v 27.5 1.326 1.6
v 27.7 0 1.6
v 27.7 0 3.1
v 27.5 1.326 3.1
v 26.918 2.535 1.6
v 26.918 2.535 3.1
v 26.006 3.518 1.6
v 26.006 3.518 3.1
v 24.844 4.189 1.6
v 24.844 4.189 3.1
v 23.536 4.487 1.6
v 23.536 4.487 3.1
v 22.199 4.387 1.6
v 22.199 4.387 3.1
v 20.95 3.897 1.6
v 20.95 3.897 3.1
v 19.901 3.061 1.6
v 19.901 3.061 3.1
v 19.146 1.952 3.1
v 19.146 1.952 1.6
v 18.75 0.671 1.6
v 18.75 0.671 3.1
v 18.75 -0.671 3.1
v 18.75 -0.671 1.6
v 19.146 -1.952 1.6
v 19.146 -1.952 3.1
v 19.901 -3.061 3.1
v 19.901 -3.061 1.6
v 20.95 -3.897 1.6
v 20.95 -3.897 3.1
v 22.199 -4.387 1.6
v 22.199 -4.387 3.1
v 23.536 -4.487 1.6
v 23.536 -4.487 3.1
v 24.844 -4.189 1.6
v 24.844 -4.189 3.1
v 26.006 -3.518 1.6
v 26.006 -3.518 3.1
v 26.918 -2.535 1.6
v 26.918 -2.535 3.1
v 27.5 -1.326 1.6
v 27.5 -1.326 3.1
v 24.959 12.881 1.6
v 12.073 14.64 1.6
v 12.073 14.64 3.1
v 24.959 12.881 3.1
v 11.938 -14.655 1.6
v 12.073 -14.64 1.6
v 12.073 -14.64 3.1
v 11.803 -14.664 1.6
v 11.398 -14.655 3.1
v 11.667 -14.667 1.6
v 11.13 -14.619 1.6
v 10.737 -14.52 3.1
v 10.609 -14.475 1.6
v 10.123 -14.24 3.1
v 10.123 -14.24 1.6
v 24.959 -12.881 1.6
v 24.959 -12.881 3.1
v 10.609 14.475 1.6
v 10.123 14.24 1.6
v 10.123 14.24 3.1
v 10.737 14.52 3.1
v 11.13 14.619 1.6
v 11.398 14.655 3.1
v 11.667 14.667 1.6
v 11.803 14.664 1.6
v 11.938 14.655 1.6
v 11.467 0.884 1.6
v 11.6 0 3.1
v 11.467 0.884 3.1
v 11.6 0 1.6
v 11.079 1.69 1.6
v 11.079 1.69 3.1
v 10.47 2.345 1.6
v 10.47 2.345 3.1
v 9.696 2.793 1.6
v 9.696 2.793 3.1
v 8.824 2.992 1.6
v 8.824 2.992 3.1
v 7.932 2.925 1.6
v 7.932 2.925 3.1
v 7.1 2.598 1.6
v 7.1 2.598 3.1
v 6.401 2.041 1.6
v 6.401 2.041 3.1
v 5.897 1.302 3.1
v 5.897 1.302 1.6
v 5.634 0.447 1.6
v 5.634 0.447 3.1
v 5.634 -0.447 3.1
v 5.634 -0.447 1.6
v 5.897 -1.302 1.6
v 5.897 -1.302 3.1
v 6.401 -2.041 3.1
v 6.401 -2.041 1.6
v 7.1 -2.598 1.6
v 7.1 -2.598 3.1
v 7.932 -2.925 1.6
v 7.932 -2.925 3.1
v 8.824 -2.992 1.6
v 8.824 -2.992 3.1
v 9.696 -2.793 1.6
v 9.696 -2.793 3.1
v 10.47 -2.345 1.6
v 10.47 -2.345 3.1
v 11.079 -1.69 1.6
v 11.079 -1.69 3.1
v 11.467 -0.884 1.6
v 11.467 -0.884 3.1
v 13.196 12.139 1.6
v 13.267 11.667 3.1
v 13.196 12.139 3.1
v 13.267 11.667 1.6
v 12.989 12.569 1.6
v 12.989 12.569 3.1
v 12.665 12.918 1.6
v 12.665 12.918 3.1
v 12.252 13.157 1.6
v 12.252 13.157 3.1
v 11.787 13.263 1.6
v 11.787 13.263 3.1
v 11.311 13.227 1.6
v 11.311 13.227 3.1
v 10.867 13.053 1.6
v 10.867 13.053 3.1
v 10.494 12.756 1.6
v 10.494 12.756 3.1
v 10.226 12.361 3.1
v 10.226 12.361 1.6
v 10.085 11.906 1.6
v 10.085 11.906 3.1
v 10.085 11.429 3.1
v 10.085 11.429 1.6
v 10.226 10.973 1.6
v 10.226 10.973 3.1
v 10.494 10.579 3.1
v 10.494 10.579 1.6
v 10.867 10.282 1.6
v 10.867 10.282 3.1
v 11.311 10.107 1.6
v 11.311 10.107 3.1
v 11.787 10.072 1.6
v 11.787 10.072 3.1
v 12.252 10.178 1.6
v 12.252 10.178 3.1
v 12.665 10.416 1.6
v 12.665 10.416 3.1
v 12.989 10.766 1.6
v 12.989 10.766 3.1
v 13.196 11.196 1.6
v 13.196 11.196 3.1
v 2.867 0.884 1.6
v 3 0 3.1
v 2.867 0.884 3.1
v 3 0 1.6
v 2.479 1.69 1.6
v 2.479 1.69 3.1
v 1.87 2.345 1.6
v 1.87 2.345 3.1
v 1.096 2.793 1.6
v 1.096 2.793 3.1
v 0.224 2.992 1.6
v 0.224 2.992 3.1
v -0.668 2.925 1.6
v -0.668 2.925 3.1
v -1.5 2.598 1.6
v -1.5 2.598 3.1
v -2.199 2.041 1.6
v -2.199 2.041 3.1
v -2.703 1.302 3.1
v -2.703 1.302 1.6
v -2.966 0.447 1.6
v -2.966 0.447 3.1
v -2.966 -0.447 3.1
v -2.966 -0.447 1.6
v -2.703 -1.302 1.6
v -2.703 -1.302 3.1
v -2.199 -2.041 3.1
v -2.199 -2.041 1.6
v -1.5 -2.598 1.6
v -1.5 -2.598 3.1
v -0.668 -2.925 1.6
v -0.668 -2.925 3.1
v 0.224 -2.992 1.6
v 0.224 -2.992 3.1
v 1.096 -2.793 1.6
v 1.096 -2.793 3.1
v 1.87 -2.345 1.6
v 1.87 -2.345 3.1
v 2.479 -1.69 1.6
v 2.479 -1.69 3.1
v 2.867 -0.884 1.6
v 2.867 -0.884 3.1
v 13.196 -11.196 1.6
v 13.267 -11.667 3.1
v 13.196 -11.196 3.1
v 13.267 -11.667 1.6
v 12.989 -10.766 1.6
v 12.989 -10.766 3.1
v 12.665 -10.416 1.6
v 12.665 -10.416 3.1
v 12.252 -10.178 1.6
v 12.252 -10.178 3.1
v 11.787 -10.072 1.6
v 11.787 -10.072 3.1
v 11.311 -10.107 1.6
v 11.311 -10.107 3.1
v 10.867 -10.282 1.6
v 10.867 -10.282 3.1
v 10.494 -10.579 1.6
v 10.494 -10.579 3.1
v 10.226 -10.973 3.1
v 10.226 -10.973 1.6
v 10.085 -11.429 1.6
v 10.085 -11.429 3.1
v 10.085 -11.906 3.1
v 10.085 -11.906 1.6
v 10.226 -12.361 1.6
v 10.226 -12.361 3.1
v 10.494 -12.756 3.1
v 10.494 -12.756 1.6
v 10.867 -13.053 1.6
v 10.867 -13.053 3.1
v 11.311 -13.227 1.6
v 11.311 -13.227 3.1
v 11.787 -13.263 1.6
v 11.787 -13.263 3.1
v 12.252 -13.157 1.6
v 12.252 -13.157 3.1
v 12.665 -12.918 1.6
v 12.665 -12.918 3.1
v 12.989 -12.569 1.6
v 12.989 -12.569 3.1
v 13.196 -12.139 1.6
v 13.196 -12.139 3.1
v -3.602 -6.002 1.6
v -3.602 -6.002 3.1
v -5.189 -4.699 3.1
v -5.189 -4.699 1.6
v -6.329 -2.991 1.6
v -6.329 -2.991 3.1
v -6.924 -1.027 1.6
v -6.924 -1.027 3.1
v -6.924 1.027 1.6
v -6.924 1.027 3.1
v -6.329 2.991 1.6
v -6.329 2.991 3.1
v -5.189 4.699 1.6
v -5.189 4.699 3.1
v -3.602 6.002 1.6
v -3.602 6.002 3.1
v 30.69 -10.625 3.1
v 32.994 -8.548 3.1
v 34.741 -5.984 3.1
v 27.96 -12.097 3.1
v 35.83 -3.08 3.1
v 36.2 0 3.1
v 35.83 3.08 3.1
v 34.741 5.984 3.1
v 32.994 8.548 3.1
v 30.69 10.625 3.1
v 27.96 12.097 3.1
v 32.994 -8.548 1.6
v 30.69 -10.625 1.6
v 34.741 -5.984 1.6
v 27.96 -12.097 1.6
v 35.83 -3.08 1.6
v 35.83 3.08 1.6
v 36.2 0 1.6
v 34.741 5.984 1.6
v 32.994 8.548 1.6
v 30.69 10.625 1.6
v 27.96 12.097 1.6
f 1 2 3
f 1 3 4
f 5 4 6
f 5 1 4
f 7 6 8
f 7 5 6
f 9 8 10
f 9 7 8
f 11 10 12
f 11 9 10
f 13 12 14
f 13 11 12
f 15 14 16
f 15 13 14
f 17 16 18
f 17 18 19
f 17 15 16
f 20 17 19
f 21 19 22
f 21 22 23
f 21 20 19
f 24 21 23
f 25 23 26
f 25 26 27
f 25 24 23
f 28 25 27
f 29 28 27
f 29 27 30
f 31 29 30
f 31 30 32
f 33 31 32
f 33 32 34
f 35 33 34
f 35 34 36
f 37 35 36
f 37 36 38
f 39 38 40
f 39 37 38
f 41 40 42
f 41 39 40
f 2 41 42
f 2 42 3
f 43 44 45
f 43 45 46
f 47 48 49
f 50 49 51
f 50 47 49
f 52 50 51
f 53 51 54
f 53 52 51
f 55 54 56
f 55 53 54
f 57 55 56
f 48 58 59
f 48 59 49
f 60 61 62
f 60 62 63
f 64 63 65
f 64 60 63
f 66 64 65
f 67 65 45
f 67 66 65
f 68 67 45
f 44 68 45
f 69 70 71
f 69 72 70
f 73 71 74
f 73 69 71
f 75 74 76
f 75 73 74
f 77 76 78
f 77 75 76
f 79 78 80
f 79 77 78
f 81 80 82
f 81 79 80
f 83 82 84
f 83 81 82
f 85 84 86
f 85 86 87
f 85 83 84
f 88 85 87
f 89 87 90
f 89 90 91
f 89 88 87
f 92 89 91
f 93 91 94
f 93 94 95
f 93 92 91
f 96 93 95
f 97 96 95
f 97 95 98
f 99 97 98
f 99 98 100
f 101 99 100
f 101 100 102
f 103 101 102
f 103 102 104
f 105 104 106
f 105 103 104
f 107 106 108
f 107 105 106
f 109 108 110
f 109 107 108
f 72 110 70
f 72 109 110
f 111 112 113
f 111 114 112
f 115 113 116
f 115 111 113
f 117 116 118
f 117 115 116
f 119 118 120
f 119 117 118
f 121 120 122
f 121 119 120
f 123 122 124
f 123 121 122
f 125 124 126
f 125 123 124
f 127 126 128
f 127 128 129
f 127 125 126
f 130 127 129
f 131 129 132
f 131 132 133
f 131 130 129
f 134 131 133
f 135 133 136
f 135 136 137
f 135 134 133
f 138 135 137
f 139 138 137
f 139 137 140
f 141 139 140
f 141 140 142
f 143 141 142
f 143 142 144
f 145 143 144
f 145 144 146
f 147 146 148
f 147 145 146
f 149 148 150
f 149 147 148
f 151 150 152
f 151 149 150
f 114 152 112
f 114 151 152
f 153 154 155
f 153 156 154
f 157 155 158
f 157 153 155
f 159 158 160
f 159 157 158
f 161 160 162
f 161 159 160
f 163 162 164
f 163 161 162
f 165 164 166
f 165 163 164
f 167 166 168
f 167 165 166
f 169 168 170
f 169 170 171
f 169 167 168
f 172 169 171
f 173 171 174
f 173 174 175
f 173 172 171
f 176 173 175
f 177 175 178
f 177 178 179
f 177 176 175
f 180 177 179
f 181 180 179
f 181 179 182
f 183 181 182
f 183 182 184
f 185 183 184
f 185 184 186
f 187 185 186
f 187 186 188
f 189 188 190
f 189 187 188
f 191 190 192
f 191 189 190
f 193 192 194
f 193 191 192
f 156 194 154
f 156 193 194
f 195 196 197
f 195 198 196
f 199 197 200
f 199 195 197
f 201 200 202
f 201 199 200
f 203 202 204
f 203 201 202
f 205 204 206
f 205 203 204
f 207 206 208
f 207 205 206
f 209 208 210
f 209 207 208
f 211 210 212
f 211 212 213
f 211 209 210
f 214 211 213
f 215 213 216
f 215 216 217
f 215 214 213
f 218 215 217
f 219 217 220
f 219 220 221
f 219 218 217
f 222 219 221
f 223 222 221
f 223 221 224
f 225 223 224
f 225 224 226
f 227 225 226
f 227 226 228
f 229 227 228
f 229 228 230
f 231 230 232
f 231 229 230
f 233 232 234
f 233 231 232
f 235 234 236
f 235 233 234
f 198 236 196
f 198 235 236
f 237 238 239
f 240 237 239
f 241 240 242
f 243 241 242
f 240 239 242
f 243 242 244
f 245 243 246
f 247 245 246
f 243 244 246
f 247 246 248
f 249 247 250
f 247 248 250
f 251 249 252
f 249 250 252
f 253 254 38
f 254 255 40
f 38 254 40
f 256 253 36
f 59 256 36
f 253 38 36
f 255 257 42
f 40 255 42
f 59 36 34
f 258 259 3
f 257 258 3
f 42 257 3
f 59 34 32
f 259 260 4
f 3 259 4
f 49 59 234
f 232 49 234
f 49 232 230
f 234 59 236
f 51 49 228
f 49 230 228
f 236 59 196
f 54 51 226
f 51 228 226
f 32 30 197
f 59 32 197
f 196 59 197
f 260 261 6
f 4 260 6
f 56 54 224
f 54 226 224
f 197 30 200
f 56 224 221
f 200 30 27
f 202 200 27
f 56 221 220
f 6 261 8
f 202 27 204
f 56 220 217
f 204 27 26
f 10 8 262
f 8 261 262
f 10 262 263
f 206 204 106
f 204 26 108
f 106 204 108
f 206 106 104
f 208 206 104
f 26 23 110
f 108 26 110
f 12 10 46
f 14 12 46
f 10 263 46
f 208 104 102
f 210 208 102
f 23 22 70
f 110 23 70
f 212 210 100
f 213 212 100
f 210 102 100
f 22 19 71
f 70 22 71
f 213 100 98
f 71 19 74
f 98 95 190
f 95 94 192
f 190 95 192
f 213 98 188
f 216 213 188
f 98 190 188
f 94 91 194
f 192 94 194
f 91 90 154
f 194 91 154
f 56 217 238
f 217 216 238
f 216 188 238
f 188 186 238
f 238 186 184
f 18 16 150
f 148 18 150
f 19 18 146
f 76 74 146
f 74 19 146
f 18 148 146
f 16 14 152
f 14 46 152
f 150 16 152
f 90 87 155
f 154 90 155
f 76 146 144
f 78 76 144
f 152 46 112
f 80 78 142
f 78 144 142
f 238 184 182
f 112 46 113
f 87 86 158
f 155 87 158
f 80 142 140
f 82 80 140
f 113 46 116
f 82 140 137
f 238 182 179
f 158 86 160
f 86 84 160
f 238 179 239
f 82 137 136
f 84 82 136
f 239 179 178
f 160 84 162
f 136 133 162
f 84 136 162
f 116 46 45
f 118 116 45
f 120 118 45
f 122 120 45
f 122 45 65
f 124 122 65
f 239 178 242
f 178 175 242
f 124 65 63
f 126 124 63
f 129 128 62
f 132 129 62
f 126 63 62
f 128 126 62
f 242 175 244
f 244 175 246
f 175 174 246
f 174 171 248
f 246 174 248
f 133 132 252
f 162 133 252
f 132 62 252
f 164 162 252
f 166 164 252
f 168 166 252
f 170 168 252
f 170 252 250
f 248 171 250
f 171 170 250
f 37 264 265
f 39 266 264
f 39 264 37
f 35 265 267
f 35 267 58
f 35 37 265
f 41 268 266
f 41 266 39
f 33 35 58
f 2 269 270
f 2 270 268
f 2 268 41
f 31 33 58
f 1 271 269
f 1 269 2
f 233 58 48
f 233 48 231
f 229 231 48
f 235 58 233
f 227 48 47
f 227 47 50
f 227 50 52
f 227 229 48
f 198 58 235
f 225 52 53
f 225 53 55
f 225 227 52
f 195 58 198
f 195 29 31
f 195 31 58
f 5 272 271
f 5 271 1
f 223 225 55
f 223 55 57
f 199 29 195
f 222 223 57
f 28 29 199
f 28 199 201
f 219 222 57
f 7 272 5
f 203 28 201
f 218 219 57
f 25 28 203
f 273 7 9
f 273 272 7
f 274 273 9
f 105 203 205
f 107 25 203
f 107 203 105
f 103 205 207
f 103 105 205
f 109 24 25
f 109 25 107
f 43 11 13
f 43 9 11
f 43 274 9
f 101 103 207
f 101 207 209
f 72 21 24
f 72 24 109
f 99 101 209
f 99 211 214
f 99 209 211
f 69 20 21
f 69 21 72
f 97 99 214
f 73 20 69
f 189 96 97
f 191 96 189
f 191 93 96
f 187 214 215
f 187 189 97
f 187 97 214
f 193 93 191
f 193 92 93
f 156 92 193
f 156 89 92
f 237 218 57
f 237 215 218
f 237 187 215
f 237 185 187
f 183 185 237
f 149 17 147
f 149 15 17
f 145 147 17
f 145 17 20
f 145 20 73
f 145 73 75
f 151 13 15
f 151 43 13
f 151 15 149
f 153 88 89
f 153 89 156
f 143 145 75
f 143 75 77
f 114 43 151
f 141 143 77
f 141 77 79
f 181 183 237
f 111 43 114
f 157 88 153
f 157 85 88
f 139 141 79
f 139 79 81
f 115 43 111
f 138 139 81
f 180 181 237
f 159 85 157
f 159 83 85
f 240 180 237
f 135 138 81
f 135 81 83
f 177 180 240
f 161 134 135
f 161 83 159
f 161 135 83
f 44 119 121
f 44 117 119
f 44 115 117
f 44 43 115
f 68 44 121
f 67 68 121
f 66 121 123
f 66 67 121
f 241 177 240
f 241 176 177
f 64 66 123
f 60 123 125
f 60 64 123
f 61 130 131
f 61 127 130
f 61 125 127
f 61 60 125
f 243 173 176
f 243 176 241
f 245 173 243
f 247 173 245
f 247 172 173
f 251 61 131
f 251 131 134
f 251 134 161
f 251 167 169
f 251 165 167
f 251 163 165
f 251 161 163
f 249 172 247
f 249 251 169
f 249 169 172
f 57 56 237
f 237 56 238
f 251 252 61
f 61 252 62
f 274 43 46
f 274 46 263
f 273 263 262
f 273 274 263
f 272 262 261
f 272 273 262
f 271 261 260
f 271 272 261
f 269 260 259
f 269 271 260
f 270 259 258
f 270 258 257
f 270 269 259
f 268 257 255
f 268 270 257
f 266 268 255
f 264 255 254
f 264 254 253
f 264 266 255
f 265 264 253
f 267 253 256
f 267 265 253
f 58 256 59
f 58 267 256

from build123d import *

# Parameters (mm, degrees)
SKETCH1_R           = 3
SKETCH1_R_2         = 4.5
SKETCH1_R_3         = 1.6
BOSS_EXTRUDE3_DEPTH = 1.6
SKETCH2_R           = 1.6
SKETCH2_R_2         = 3
SKETCH2_R_3         = 4.5
BOSS_EXTRUDE4_DEPTH = 1.5
SKETCH3_R           = 63.206562555
CUT_EXTRUDE1_DEPTH  = 1.6
SKETCH4_R           = 3
SKETCH4_R_2         = 1.6
BOSS_EXTRUDE5_DEPTH = 1.5


with BuildPart() as part:
    # Sketch1 → Boss-Extrude3 (new body)
    with BuildSketch(Plane.XY):
        with BuildLine():
            Line((12.073070054, 14.639688463), (24.958502044, 12.880515151))
            ThreePointArc((24.958502044, 12.880515151), (36.2, 0), (24.958502044, -12.880515151))
            Line((24.958502044, -12.880515151), (12.073070054, -14.639688463))
            ThreePointArc((12.073070054, -14.639688463), (11.870633815, -14.660360595), (11.66726189, -14.66726189))
            Line((11.66726189, -14.66726189), (0, -14.66726189))
            ThreePointArc((0, -14.66726189), (-0.888679088, -14.53261518), (-1.697586366, -14.140761542))
            Line((-1.697586366, -14.140761542), (-18.697586366, -2.473499652))
            ThreePointArc((-18.697586366, -2.473499652), (-19.891071988, -0.801063519), (-19.728500117, 1.247111507))
            Line((-19.728500117, 1.247111507), (-14.395762007, 12.914373397))
            ThreePointArc((-14.395762007, 12.914373397), (-13.288783625, 14.191279968), (-11.66726189, 14.66726189))
            Line((-11.66726189, 14.66726189), (11.66726189, 14.66726189))
            ThreePointArc((11.66726189, 14.66726189), (11.870633815, 14.660360595), (12.073070054, 14.639688463))
        make_face()
        Circle(SKETCH1_R, mode=Mode.SUBTRACT)
        with Locations((23.2, 0)):
            Circle(SKETCH1_R_2, mode=Mode.SUBTRACT)
        with Locations((8.6, 0)):
            Circle(SKETCH1_R, mode=Mode.SUBTRACT)
        with Locations((-17, 0)):
            Circle(SKETCH1_R_3, mode=Mode.SUBTRACT)
        with Locations((0, -11.66726189)):
            Circle(SKETCH1_R_3, mode=Mode.SUBTRACT)
        with Locations((11.66726189, -11.66726189)):
            Circle(SKETCH1_R_3, mode=Mode.SUBTRACT)
        with Locations((-11.66726189, 11.66726189)):
            Circle(SKETCH1_R_3, mode=Mode.SUBTRACT)
        with Locations((0, 11.66726189)):
            Circle(SKETCH1_R_3, mode=Mode.SUBTRACT)
        with Locations((11.66726189, 11.66726189)):
            Circle(SKETCH1_R_3, mode=Mode.SUBTRACT)
    extrude(amount=BOSS_EXTRUDE3_DEPTH)

    # Sketch2 → Boss-Extrude4 (add)
    with BuildSketch(Plane.XY.offset(1.6)):
        with BuildLine():
            Line((12.073070054, 14.639688463), (24.958502044, 12.880515151))
            ThreePointArc((24.958502044, 12.880515151), (36.2, 0), (24.958502044, -12.880515151))
            Line((24.958502044, -12.880515151), (12.073070054, -14.639688463))
            ThreePointArc((12.073070054, -14.639688463), (10.884137398, -14.56324463), (9.81871257, -14.030070687))
            Line((9.81871257, -14.030070687), (-3.080915533, -3.938014662))
            ThreePointArc((-3.080915533, -3.938014662), (-5, 0), (-3.080915533, 3.938014662))
            Line((-3.080915533, 3.938014662), (9.81871257, 14.030070687))
            ThreePointArc((9.81871257, 14.030070687), (10.884137398, 14.56324463), (12.073070054, 14.639688463))
        make_face()
        with Locations((11.66726189, 11.66726189)):
            Circle(SKETCH2_R, mode=Mode.SUBTRACT)
        Circle(SKETCH2_R_2, mode=Mode.SUBTRACT)
        with Locations((8.6, 0)):
            Circle(SKETCH2_R_2, mode=Mode.SUBTRACT)
        with Locations((23.2, 0)):
            Circle(SKETCH2_R_3, mode=Mode.SUBTRACT)
        with Locations((11.66726189, -11.66726189)):
            Circle(SKETCH2_R, mode=Mode.SUBTRACT)
    extrude(amount=BOSS_EXTRUDE4_DEPTH)

    # Sketch3 → Cut-Extrude1 (cut)
    with BuildSketch(Plane(origin=(0, 0, 0), x_dir=(-1, 0, 0), z_dir=(0, 0, -1))):
        Circle(SKETCH3_R)
    extrude(amount=-CUT_EXTRUDE1_DEPTH, mode=Mode.SUBTRACT)

    # Sketch4 → Boss-Extrude5 (add)
    with BuildSketch(Plane.XY.offset(3.1)):
        with BuildLine():
            Line((-3.602159399, 6.00203696), (10.12347929, 14.239563444))
            ThreePointArc((10.12347929, 14.239563444), (13.145208472, 14.277946455), (14.66726189, 11.66726189))
            Line((14.66726189, 11.66726189), (14.66726189, -11.66726189))
            ThreePointArc((14.66726189, -11.66726189), (13.145208472, -14.277946455), (10.12347929, -14.239563444))
            Line((10.12347929, -14.239563444), (-3.602159399, -6.00203696))
            ThreePointArc((-3.602159399, -6.00203696), (-7, 0), (-3.602159399, 6.00203696))
        make_face()
        Circle(SKETCH4_R, mode=Mode.SUBTRACT)
        with Locations((8.6, 0)):
            Circle(SKETCH4_R, mode=Mode.SUBTRACT)
        with Locations((11.66726189, 11.66726189)):
            Circle(SKETCH4_R_2, mode=Mode.SUBTRACT)
        with Locations((11.66726189, -11.66726189)):
            Circle(SKETCH4_R_2, mode=Mode.SUBTRACT)
    extrude(amount=-BOSS_EXTRUDE5_DEPTH)


solid = part.part
